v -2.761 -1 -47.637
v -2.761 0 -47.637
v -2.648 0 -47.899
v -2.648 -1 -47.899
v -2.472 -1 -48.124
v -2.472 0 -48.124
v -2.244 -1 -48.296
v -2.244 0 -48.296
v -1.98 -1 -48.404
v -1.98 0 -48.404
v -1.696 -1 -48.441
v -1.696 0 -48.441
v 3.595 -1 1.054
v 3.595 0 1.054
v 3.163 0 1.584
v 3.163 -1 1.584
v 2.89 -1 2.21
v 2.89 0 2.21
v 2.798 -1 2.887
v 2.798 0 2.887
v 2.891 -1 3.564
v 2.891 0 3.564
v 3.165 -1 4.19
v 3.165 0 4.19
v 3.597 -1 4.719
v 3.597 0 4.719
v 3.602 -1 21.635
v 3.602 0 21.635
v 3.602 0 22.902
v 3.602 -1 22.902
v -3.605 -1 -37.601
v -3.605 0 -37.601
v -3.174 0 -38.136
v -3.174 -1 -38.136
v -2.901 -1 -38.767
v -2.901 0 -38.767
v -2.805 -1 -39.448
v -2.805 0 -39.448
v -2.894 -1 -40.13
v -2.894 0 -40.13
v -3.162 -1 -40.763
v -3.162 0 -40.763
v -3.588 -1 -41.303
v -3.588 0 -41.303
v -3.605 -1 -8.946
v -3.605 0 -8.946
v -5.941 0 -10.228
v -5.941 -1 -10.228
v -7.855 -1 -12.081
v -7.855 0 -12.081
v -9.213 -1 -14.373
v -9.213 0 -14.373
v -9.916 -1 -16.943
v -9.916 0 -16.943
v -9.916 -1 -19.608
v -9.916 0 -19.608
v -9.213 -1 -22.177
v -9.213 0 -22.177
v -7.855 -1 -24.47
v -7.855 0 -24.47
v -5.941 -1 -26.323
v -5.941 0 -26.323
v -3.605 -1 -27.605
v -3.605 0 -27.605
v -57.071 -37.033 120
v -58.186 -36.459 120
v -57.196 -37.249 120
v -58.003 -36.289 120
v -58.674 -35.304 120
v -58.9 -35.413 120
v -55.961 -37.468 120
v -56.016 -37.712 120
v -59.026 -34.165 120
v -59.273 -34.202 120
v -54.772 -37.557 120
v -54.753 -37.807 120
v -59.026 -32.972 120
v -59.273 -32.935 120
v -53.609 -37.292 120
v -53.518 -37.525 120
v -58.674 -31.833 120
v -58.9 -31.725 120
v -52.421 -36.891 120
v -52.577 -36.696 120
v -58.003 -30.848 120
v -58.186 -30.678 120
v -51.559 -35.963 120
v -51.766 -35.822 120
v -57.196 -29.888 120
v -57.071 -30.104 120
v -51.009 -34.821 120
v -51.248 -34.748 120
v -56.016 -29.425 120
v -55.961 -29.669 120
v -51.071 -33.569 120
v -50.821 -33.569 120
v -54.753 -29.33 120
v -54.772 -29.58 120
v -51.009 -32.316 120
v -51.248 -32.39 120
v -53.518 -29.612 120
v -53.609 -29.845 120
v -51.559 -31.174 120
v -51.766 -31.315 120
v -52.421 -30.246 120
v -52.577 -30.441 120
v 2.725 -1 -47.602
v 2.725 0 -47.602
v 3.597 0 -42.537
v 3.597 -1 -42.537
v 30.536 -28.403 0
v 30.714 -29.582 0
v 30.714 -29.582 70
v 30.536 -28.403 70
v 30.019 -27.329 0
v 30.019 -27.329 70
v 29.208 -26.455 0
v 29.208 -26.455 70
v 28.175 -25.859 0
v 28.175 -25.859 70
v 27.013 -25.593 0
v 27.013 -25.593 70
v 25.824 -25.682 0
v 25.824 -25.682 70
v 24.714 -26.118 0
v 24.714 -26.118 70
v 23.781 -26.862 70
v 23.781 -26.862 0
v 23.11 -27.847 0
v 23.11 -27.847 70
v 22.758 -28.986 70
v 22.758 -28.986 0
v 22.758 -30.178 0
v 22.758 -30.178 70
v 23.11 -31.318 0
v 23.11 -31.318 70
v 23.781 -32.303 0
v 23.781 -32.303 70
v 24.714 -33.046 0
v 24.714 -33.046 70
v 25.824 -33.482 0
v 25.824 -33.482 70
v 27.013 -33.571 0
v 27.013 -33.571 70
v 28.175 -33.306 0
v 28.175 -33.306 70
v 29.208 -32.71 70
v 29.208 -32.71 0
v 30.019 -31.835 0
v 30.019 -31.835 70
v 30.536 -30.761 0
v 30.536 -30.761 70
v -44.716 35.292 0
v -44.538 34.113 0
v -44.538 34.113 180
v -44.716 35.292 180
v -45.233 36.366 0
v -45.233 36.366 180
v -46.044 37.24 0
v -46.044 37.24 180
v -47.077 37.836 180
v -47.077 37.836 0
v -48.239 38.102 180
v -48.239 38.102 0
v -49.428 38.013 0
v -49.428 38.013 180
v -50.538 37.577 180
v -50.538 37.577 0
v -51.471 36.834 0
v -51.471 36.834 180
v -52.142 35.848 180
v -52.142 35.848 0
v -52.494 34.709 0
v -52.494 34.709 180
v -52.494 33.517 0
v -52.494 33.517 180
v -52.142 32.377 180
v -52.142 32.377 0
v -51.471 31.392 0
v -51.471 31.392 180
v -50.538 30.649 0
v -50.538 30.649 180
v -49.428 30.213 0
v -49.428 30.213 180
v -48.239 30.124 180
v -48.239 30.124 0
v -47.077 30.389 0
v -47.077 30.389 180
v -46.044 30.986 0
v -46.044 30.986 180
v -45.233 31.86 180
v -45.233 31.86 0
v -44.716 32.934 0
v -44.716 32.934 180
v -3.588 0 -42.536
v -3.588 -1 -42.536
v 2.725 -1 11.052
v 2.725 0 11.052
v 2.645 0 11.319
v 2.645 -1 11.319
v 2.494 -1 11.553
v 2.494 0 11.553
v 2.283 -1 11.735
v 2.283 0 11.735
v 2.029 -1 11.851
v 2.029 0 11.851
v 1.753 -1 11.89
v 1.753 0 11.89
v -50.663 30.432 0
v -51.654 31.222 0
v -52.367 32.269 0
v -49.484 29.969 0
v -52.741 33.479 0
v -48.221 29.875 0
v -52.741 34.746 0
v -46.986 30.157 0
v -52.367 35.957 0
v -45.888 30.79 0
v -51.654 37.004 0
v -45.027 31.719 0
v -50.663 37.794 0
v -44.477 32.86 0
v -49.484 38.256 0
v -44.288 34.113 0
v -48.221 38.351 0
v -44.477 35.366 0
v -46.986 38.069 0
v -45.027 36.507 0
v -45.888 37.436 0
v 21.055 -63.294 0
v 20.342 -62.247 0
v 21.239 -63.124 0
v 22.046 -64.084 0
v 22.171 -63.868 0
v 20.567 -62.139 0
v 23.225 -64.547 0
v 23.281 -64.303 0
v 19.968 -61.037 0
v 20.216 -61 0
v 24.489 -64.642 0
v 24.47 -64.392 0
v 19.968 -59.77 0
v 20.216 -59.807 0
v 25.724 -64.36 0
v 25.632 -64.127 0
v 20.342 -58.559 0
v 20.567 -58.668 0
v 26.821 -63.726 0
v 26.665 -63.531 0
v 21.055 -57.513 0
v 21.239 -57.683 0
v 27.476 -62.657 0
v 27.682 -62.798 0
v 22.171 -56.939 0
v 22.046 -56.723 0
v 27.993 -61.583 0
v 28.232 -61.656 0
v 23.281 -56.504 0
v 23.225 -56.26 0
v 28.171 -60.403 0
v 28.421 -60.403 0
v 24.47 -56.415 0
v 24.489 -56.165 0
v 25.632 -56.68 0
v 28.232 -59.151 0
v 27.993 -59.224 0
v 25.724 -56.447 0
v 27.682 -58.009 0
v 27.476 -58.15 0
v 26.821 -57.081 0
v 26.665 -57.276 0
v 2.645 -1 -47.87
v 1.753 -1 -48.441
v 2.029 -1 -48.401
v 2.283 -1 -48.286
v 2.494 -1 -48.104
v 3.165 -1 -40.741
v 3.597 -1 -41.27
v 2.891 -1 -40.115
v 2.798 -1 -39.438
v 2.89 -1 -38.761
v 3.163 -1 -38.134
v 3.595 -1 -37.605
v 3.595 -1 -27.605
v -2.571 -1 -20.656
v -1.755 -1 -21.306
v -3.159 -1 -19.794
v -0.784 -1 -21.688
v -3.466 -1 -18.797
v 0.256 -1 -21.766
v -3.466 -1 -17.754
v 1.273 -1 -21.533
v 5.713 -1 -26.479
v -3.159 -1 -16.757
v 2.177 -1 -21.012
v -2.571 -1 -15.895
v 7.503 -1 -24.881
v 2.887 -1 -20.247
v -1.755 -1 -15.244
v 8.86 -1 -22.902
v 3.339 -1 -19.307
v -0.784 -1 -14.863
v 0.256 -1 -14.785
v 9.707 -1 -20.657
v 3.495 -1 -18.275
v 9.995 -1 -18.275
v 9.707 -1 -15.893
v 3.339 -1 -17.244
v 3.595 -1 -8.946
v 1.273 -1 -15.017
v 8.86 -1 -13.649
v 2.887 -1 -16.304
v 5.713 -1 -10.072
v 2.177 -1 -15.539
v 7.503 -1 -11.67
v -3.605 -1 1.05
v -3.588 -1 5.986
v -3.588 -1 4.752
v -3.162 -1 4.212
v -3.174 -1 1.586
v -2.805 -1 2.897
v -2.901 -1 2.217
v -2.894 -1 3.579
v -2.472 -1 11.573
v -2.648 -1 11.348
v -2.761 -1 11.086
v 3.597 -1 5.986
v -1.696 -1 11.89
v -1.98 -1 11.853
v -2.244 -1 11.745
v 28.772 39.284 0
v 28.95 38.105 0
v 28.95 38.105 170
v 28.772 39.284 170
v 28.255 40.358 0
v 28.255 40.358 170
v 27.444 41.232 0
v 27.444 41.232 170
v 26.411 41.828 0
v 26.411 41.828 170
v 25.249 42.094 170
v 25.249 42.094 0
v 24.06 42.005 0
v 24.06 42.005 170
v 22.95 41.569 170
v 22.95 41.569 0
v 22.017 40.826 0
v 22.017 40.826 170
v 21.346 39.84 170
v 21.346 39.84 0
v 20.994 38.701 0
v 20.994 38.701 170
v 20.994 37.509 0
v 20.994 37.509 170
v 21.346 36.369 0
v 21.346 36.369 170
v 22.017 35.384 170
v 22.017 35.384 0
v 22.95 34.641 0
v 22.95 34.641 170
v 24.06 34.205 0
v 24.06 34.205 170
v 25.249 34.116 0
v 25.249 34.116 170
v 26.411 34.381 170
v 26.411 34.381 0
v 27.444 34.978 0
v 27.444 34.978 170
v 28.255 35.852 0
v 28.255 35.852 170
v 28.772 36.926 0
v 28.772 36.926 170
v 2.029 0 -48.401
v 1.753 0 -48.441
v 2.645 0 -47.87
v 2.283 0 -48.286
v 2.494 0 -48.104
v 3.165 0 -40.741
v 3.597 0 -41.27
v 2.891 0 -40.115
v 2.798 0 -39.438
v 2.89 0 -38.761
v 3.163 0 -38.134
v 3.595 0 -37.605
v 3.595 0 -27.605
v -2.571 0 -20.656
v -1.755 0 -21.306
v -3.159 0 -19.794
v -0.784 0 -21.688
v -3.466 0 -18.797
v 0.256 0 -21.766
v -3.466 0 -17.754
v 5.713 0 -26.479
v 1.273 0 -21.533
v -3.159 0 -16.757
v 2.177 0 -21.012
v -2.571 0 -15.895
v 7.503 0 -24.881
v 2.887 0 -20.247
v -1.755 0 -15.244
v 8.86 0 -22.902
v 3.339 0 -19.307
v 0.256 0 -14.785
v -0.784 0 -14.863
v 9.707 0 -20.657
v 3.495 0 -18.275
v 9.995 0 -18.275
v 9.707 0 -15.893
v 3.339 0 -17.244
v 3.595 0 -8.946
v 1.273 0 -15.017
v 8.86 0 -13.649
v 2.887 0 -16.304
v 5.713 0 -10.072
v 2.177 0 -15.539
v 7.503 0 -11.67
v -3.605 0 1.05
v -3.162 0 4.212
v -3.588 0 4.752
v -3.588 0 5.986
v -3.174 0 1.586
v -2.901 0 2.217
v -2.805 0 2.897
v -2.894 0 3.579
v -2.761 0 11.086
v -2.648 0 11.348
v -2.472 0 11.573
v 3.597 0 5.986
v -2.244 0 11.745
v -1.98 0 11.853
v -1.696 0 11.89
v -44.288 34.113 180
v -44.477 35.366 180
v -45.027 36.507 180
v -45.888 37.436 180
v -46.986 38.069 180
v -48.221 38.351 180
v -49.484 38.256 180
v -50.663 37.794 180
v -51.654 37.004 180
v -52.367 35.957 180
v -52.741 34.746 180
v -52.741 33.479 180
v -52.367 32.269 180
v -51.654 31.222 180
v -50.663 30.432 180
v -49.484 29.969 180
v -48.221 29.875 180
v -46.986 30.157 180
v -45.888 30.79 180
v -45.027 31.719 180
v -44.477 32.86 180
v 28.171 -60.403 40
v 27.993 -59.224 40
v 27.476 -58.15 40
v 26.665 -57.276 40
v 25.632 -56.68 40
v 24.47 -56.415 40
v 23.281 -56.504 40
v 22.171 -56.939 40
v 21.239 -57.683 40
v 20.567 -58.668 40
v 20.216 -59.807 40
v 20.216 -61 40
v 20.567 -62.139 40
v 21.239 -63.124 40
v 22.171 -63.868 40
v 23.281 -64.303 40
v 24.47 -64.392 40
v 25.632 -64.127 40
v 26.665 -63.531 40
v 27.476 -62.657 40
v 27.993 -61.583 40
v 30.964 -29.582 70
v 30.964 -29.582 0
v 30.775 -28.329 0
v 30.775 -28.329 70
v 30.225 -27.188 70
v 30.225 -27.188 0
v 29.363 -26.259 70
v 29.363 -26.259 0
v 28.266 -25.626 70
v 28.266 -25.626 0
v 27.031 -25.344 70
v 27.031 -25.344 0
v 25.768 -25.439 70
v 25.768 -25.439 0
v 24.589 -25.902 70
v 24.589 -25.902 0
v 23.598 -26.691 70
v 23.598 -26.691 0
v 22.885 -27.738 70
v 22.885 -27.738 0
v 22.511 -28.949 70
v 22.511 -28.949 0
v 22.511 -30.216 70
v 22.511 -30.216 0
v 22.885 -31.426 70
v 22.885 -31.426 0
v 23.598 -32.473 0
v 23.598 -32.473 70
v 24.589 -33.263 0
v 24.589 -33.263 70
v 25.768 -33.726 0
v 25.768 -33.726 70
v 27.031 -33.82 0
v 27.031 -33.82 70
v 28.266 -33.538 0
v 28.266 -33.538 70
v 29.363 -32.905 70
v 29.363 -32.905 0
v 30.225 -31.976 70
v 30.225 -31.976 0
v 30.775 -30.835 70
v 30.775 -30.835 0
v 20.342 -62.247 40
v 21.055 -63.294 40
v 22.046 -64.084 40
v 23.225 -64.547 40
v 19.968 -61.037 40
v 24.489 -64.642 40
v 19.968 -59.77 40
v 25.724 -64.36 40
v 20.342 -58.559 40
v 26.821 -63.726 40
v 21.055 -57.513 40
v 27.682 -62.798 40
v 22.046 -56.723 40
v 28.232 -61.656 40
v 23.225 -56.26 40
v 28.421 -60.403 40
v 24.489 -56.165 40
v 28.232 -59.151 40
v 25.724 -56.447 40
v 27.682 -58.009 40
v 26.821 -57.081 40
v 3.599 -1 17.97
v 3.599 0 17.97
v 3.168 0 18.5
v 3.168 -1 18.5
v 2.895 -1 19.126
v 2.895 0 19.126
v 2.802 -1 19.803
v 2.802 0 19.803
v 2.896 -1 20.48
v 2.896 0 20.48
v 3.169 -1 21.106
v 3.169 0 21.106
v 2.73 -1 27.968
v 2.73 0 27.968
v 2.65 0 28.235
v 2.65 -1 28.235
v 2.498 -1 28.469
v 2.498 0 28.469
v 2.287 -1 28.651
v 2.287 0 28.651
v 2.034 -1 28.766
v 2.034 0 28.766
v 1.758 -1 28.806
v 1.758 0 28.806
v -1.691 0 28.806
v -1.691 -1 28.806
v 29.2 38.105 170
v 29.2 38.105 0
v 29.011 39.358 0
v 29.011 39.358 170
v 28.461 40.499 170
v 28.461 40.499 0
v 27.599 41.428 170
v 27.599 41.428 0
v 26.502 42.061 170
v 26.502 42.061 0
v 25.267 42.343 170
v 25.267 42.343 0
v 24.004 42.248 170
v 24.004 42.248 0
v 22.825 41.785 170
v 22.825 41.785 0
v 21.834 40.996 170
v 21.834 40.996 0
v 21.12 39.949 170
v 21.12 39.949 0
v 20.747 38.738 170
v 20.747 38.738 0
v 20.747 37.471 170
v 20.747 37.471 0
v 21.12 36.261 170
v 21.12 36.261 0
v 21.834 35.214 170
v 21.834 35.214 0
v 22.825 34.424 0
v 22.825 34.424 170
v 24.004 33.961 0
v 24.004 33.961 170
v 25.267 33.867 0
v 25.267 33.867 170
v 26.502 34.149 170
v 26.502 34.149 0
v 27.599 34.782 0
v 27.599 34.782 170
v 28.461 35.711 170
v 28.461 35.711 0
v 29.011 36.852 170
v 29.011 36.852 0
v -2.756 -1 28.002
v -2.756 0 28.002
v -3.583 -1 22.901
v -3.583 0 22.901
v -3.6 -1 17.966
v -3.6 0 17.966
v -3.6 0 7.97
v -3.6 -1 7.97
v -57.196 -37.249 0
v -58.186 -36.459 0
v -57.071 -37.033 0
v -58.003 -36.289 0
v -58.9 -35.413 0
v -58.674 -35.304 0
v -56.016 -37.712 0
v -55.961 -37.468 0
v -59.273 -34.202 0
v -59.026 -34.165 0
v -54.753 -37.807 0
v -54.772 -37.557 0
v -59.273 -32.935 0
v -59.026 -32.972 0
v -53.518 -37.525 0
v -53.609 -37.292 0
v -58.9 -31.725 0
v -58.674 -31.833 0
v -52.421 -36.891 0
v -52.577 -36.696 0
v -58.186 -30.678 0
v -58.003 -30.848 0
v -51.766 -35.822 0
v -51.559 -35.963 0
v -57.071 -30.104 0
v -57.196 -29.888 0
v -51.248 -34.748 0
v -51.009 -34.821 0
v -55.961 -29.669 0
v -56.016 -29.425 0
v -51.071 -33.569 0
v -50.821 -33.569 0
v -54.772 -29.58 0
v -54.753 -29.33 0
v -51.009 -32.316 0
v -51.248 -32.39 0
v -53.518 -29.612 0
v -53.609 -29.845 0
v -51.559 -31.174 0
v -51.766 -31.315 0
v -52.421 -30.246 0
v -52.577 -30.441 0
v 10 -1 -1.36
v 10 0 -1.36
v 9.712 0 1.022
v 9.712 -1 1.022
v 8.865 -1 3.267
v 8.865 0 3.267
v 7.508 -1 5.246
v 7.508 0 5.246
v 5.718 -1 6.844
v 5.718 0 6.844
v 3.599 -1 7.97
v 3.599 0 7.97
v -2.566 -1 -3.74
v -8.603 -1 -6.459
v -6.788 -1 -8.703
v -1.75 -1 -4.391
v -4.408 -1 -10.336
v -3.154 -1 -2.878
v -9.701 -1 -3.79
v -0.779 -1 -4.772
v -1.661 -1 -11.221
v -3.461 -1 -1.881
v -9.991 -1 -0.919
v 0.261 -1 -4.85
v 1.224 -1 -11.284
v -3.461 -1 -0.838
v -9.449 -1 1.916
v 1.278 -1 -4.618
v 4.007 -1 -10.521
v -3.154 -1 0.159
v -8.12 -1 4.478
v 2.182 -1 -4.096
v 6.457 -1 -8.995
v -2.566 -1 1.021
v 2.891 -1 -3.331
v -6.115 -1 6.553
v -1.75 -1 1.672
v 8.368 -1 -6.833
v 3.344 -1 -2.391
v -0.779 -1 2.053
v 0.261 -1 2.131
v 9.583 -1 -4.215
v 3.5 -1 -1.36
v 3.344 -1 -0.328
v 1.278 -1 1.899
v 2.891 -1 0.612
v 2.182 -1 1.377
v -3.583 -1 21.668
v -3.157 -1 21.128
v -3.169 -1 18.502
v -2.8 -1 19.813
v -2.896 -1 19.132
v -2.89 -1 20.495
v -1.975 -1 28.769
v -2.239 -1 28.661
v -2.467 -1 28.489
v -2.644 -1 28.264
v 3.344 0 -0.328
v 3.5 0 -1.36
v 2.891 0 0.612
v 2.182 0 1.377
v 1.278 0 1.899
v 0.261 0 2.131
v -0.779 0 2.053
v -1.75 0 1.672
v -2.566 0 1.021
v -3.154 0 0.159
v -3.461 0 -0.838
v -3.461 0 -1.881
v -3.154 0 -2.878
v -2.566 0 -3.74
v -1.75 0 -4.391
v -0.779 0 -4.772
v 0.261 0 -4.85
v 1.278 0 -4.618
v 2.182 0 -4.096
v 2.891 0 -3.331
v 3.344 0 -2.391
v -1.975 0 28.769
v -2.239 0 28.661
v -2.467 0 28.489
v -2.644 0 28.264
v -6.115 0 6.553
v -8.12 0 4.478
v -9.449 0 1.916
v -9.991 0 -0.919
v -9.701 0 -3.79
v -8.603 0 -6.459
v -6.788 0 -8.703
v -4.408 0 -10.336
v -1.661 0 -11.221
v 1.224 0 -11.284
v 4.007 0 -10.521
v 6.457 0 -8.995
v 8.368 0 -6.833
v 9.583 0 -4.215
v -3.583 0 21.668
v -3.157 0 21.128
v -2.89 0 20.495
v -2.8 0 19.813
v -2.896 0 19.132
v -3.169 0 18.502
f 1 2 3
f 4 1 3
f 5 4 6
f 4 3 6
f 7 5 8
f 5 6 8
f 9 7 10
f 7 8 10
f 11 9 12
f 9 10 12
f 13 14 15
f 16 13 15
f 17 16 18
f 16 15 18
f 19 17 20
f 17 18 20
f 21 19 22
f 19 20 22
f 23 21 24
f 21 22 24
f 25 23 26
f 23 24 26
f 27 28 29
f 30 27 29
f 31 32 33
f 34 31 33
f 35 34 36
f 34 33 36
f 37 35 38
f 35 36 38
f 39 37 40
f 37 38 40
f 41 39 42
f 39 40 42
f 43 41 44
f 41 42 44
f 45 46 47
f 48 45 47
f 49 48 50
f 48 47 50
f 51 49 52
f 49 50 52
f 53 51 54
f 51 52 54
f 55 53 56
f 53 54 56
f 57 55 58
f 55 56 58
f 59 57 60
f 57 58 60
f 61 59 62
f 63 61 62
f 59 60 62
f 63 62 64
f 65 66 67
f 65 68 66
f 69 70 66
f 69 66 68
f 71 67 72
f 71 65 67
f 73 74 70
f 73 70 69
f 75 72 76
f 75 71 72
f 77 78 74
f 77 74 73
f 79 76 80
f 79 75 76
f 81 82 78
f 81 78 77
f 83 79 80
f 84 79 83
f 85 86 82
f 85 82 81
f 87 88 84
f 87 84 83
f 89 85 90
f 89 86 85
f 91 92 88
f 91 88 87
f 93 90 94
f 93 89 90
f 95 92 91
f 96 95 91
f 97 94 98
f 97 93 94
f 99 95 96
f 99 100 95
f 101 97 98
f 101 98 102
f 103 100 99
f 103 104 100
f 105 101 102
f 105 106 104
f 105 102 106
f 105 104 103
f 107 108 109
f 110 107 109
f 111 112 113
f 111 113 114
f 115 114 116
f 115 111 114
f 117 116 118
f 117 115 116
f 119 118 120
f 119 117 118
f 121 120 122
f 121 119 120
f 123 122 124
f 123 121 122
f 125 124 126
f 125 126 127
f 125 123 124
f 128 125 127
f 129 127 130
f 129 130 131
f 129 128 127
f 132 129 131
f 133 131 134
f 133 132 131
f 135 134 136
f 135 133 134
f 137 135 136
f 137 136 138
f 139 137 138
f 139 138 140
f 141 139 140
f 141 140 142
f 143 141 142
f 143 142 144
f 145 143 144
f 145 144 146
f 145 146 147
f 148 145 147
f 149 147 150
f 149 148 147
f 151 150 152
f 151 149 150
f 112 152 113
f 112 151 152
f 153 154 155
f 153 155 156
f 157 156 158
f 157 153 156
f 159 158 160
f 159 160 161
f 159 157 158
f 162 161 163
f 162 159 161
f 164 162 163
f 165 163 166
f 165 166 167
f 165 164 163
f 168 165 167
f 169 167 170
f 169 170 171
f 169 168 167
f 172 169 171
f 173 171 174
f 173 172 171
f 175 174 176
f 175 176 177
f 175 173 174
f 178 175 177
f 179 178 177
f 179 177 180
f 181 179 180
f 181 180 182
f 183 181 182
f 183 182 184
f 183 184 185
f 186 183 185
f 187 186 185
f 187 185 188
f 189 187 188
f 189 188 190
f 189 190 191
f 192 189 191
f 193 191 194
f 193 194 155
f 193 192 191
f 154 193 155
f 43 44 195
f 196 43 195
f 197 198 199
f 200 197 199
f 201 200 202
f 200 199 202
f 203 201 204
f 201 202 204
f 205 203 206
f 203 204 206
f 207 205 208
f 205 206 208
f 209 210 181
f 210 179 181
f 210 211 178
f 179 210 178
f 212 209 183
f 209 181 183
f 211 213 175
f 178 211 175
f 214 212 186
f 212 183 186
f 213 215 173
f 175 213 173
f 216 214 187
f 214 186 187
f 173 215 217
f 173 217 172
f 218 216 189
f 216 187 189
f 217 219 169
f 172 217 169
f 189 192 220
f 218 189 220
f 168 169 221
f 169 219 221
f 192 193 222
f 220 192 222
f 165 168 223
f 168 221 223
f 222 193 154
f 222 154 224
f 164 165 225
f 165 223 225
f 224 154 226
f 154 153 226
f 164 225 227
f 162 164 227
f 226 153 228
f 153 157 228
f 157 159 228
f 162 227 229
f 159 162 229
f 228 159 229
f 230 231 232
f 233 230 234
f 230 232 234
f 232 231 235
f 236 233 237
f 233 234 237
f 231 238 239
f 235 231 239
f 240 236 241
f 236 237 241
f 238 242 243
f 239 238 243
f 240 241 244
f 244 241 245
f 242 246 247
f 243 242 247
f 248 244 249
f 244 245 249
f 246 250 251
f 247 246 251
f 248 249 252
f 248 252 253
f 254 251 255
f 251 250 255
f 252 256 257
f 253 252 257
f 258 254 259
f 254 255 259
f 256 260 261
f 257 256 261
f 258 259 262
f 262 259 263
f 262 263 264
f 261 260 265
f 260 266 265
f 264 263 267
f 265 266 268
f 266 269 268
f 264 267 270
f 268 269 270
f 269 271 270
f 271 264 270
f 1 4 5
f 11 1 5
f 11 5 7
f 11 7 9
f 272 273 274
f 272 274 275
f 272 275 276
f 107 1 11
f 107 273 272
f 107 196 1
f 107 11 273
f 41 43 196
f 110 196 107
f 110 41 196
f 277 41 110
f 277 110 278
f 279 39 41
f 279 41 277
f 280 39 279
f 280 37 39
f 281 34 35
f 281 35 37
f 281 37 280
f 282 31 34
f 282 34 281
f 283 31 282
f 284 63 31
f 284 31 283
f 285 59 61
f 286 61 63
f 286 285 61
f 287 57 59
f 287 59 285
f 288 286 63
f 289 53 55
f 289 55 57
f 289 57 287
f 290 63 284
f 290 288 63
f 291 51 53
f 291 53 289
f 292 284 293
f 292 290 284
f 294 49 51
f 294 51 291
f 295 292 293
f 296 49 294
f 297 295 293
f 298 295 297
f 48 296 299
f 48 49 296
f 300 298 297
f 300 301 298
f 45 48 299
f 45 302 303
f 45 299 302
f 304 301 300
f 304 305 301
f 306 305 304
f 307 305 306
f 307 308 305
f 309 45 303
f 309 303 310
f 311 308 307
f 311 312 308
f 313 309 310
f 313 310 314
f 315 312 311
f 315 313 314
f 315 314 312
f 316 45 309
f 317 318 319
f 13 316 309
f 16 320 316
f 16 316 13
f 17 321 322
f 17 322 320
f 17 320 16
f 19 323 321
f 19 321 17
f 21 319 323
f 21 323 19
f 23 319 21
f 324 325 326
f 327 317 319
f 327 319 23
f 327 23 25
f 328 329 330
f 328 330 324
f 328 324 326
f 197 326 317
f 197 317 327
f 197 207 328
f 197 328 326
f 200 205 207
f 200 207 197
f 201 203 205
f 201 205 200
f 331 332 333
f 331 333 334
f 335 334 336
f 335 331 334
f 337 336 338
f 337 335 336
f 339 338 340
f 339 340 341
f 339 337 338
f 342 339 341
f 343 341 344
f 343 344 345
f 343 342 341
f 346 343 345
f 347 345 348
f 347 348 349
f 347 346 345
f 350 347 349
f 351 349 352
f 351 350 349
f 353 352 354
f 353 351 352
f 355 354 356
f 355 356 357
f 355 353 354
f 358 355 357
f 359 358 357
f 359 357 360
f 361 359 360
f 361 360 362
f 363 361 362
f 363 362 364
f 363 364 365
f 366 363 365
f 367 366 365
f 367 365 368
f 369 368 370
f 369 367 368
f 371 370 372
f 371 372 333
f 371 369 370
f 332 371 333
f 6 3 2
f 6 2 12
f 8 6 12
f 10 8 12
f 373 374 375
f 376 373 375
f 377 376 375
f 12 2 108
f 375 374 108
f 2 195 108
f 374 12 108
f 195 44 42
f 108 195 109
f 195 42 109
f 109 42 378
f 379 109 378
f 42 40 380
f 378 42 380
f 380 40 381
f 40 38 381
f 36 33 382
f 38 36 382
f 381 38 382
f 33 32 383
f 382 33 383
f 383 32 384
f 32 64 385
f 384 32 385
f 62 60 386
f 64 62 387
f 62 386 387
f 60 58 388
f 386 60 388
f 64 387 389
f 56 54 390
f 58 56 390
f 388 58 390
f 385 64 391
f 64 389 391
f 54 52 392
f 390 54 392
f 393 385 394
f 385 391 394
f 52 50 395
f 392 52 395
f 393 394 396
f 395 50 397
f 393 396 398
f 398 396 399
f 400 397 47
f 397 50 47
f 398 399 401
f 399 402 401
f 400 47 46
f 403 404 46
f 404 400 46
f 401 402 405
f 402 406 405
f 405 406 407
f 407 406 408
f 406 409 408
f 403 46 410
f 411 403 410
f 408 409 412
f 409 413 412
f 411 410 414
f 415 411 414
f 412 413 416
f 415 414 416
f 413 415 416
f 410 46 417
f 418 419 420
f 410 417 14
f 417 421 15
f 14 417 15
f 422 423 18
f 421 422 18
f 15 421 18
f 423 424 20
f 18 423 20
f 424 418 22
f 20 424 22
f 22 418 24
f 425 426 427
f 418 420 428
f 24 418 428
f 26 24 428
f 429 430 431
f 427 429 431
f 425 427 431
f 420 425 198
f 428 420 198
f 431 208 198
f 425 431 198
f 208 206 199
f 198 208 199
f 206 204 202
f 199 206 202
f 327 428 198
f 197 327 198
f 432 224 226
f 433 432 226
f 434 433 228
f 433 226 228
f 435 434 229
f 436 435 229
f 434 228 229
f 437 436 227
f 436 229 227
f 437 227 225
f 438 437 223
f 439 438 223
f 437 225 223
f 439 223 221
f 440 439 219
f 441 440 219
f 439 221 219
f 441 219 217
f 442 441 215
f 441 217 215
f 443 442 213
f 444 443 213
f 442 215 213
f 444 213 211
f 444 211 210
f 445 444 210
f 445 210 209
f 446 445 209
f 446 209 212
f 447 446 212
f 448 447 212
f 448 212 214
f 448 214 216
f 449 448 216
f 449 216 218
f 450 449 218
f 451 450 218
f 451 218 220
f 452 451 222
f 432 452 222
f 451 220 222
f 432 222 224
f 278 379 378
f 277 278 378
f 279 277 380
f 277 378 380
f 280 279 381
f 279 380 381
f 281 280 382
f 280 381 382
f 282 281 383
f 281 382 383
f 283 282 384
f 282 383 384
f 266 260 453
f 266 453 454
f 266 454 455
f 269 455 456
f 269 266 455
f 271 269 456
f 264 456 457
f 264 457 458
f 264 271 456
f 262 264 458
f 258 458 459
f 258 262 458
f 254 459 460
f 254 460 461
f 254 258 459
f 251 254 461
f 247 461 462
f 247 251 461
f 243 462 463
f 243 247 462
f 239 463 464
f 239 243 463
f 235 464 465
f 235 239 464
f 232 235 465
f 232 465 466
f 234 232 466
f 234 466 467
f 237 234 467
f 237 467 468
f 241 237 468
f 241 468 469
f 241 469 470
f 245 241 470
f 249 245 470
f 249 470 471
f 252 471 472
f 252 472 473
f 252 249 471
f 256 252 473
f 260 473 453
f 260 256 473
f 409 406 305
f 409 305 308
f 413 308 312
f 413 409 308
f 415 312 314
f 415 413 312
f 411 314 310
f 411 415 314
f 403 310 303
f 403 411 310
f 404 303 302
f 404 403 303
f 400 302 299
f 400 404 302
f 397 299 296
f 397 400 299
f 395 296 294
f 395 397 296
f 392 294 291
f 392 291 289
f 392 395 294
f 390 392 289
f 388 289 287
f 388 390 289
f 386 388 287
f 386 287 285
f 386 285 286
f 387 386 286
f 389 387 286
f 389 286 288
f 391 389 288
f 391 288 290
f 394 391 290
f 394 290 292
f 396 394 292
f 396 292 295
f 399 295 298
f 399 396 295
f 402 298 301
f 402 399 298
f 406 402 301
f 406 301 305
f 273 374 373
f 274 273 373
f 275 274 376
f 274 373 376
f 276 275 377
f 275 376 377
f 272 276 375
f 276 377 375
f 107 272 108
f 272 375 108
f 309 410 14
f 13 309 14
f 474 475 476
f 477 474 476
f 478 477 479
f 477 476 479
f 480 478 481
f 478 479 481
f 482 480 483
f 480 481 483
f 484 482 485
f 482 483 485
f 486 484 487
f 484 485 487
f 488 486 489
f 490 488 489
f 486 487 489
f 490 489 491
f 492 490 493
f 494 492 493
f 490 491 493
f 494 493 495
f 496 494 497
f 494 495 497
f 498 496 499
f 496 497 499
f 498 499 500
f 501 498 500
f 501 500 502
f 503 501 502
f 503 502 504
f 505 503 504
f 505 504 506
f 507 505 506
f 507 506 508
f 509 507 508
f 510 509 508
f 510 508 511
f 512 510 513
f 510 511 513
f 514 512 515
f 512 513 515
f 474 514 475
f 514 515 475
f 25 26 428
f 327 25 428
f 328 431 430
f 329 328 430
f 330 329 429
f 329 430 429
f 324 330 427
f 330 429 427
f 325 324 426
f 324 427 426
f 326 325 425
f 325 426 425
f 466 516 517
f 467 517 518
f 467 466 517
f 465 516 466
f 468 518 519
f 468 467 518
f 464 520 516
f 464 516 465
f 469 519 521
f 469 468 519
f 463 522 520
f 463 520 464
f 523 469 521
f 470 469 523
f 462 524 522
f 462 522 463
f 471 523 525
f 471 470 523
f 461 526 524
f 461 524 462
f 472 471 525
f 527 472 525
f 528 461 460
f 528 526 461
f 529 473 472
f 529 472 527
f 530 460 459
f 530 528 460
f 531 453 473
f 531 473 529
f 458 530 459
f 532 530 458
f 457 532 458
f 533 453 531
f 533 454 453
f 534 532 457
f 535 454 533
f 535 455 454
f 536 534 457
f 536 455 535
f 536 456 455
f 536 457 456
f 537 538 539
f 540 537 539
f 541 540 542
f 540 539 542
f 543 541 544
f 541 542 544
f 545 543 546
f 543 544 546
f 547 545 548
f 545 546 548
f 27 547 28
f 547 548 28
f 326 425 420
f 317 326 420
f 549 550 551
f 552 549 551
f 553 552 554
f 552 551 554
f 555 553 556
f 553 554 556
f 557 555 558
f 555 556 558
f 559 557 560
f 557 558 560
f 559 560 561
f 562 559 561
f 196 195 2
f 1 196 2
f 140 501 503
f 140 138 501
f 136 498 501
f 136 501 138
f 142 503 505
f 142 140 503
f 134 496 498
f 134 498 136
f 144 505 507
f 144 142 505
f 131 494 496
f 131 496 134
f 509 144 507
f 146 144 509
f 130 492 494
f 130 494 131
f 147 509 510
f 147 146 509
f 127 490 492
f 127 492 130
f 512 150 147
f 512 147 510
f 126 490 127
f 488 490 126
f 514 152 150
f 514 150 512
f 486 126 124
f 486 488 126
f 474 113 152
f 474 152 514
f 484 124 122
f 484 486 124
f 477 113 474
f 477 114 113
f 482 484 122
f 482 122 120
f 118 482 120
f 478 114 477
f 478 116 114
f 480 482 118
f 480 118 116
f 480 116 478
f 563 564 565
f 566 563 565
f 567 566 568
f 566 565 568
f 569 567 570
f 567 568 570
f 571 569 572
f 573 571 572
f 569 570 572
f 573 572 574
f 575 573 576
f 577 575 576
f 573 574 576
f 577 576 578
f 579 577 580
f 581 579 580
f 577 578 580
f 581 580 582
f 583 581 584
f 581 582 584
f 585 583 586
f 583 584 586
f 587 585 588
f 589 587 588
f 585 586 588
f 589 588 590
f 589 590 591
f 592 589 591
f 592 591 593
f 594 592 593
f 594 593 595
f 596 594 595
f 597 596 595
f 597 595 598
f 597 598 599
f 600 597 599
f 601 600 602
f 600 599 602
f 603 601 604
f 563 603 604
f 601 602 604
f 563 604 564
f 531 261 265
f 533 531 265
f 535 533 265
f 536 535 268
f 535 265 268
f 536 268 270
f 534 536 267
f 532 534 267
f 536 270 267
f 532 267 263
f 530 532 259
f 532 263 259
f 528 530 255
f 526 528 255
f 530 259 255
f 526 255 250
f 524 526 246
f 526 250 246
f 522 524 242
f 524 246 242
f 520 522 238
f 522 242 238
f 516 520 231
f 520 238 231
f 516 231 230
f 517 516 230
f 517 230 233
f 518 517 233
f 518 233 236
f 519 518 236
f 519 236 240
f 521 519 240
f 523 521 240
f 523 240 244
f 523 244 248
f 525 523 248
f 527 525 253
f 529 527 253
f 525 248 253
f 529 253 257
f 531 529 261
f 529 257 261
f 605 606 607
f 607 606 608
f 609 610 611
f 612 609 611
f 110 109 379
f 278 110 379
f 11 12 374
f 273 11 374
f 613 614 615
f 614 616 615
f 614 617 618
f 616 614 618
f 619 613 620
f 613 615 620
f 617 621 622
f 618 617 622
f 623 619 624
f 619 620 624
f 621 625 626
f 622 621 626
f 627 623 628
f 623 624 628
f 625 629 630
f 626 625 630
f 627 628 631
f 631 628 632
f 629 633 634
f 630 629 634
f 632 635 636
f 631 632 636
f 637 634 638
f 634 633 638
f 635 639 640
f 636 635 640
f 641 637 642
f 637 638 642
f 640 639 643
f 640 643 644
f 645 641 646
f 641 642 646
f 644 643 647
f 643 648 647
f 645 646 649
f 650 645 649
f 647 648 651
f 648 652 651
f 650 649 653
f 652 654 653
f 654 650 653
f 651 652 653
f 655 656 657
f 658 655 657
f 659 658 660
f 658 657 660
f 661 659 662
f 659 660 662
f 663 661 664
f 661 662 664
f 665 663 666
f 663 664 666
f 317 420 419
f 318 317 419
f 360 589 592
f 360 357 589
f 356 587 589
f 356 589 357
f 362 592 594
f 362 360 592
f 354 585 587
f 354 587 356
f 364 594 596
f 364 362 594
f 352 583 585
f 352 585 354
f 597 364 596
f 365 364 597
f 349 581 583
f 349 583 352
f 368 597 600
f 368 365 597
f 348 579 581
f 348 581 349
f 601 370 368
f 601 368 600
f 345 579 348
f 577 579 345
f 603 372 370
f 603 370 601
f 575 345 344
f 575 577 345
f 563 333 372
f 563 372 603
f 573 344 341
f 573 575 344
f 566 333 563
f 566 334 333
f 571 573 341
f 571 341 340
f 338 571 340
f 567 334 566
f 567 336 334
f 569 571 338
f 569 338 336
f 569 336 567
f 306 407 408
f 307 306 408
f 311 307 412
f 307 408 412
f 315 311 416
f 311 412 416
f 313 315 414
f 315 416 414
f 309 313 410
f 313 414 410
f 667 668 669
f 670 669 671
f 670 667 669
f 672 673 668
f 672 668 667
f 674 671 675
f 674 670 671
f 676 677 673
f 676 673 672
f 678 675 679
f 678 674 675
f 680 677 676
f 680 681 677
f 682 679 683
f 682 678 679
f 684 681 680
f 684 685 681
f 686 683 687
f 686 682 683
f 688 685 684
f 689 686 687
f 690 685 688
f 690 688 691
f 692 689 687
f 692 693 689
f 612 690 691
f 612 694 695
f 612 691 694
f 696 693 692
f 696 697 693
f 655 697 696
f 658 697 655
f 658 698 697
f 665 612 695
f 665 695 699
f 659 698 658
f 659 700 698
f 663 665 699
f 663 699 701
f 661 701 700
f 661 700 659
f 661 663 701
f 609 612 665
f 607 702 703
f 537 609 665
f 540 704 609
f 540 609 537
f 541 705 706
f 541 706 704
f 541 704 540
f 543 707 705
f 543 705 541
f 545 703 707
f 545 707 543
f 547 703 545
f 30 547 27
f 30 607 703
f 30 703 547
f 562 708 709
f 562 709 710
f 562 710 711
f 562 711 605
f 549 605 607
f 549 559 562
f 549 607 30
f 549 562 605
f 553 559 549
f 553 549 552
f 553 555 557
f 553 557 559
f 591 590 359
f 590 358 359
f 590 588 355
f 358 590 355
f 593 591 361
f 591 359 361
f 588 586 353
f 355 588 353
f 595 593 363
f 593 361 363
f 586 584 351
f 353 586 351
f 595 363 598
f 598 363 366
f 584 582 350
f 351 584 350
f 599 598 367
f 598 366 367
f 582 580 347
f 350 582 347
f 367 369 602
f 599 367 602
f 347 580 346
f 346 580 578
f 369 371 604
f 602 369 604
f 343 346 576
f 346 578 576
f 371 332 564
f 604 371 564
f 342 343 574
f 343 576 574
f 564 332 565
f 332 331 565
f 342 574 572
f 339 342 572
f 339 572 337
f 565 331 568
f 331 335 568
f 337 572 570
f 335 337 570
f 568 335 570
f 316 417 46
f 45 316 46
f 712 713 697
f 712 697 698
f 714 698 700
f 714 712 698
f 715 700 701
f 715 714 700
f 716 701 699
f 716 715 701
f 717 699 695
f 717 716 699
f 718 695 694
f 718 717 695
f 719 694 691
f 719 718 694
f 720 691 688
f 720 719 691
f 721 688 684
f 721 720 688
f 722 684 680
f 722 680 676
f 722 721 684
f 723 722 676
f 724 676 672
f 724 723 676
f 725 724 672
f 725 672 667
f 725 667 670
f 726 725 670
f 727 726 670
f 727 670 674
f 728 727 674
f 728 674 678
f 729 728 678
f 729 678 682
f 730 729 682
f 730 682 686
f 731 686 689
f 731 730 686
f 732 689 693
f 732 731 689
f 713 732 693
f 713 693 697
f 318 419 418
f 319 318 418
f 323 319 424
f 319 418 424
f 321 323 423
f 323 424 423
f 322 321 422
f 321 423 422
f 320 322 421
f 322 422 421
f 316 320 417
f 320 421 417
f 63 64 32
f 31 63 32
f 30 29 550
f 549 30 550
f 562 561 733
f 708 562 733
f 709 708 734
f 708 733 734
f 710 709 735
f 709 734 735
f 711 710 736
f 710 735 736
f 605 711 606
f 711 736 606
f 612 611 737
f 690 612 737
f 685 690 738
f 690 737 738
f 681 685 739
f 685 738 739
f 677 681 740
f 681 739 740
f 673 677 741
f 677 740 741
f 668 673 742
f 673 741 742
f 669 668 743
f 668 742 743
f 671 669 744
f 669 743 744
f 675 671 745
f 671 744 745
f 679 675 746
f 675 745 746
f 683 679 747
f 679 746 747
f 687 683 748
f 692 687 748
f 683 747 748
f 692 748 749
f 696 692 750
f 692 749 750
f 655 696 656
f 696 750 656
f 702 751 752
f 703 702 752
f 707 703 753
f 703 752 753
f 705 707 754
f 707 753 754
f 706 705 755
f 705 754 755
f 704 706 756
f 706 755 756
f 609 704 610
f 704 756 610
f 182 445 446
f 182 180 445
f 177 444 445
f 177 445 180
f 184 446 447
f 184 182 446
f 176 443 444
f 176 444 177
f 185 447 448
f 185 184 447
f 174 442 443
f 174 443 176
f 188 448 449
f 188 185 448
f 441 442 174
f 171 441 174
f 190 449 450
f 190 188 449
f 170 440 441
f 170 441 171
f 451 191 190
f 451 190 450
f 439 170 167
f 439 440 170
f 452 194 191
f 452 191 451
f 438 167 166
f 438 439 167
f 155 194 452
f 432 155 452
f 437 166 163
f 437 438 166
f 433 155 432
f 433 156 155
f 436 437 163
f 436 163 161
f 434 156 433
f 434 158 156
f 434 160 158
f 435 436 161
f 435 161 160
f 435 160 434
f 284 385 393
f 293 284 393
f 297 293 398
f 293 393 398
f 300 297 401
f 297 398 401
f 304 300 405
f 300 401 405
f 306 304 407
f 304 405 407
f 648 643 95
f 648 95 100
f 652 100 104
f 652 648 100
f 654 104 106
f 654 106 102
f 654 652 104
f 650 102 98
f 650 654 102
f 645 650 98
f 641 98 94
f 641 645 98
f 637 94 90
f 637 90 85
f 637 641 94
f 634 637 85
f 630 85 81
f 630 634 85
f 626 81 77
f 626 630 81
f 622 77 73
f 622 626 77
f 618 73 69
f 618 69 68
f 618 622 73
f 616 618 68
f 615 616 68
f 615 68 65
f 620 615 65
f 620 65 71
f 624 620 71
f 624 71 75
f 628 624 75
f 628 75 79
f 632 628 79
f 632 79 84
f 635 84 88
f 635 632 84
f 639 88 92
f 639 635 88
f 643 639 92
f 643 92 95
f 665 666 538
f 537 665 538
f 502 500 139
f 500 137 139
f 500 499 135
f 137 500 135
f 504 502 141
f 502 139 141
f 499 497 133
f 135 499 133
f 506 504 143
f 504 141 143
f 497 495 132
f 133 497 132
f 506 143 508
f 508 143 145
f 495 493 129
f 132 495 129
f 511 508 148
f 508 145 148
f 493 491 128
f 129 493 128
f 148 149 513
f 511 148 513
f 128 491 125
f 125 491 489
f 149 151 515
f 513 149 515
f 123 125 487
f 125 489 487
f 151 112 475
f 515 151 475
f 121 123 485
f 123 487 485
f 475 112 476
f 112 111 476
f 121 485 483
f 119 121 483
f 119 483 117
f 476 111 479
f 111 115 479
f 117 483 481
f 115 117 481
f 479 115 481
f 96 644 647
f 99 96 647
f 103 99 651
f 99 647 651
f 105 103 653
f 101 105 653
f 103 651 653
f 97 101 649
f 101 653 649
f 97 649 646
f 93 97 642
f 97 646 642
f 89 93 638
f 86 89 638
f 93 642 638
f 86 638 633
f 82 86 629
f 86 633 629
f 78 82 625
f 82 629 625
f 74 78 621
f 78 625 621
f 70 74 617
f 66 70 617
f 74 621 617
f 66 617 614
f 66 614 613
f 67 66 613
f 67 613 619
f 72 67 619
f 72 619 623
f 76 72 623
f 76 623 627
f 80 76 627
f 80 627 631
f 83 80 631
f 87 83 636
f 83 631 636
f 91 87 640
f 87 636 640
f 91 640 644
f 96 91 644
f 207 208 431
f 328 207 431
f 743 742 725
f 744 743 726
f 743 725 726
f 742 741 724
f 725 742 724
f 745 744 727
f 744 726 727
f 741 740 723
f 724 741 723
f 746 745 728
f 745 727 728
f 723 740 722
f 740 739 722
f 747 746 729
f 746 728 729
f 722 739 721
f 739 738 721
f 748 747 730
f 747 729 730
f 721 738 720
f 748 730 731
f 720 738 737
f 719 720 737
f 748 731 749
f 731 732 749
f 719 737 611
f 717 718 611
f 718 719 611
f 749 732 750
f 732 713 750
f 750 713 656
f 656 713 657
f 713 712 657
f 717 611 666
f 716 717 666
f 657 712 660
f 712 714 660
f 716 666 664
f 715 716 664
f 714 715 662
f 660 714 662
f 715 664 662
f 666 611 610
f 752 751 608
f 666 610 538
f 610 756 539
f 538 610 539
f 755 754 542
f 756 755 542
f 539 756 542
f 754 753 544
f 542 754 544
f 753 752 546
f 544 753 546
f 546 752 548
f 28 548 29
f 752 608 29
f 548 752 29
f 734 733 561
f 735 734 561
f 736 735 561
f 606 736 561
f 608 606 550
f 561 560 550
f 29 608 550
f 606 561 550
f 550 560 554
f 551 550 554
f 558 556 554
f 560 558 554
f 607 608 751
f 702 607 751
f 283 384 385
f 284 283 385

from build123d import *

# Parameters (mm, degrees)
F0_R      = 3.5
F1_DEPTH  = 1
F2_R      = 4.25
F2_R_2    = 4
F3_DEPTH  = 120
F4_R      = 4.25
F4_R_2    = 4
F5_DEPTH  = 180
F6_R      = 4.25
F6_R_2    = 4
F7_DEPTH  = 170
F8_R      = 4.25
F8_R_2    = 4
F9_DEPTH  = 70
F10_R     = 4.25
F10_R_2   = 4
F11_DEPTH = 40
F12_R     = 3.5
F13_DEPTH = 1


with BuildPart() as f1:
    # F0 (on Front) → F1 (new body)
    with BuildSketch(Plane.XZ):
        with BuildLine():
            ThreePointArc((-1.691495, 28.806018), (-2.358822, 28.582301), (-2.756461, 28.001562))
            Line((-2.756461, 28.001562), (-3.583157, 22.901481))
            Line((-3.583157, 22.901481), (-3.583157, 21.667795))
            ThreePointArc((-3.583157, 21.667795), (-2.800422, 19.813258), (-3.600286, 17.966043))
            Line((-3.600286, 17.966043), (-3.600286, 11.83005))
            Line((-3.600286, 11.83005), (3.599391, 11.83005))
            Line((3.599391, 11.83005), (3.599391, 17.969944))
            ThreePointArc((3.599391, 17.969944), (2.802389, 19.803012), (3.601747, 21.635054))
            Line((3.601747, 21.635054), (3.601747, 22.901675))
            Line((3.601747, 22.901675), (2.729514, 27.967552))
            ThreePointArc((2.729514, 27.967552), (2.399436, 28.567432), (1.757654, 28.806018))
            Line((1.757654, 28.806018), (-1.691495, 28.806018))
        make_face()
        with BuildLine():
            Line((3.599391, 11.83005), (-3.600286, 11.83005))
            Line((-3.600286, 11.83005), (-3.600286, 7.97005))
            ThreePointArc((-3.600286, 7.97005), (-0.000448, 8.640464), (3.599391, 7.97005))
            Line((3.599391, 7.97005), (3.599391, 11.83005))
        make_face()
        with BuildLine():
            ThreePointArc((3.599391, 7.97005), (-0.000448, 8.640464), (-3.600286, 7.97005))
            Line((-3.600286, 7.97005), (3.599391, 7.97005))
        make_face()
        with BuildLine():
            Line((3.599391, 7.97005), (-3.600286, 7.97005))
            ThreePointArc((-3.600286, 7.97005), (-5.657373, -9.605698), (9.999552, -1.359536))
            ThreePointArc((9.999552, -1.359536), (8.245715, 4.29739), (3.599391, 7.97005))
        make_face()
        with Locations((-0.000448, -1.359536)):
            Circle(F0_R, mode=Mode.SUBTRACT)
    extrude(amount=F1_DEPTH)


with BuildPart() as f3:
    # F2 (on Top) → F3 (new body)
    with BuildSketch(Plane.XY):
        with Locations((-55.070568, -33.56855)):
            Circle(F2_R)
        with Locations((-55.070568, -33.56855)):
            Circle(F2_R_2, mode=Mode.SUBTRACT)
    extrude(amount=F3_DEPTH)


with BuildPart() as f5:
    # F4 (on Top) → F5 (new body)
    with BuildSketch(Plane.XY):
        with Locations((-48.538309, 34.112904)):
            Circle(F4_R)
        with Locations((-48.538309, 34.112904)):
            Circle(F4_R_2, mode=Mode.SUBTRACT)
    extrude(amount=F5_DEPTH)


with BuildPart() as f7:
    # F6 (on Top) → F7 (new body)
    with BuildSketch(Plane.XY):
        with Locations((24.949595, 38.10484)):
            Circle(F6_R)
        with Locations((24.949595, 38.10484)):
            Circle(F6_R_2, mode=Mode.SUBTRACT)
    extrude(amount=F7_DEPTH)


with BuildPart() as f9:
    # F8 (on Top) → F9 (new body)
    with BuildSketch(Plane.XY):
        with Locations((26.713643, -29.582191)):
            Circle(F8_R)
        with Locations((26.713643, -29.582191)):
            Circle(F8_R_2, mode=Mode.SUBTRACT)
    extrude(amount=F9_DEPTH)


with BuildPart() as f11:
    # F10 (on Top) → F11 (new body)
    with BuildSketch(Plane.XY):
        with Locations((24.170965, -60.403489)):
            Circle(F10_R)
        with Locations((24.170965, -60.403489)):
            Circle(F10_R_2, mode=Mode.SUBTRACT)
    extrude(amount=F11_DEPTH)


with BuildPart() as f13:
    # F12 (on Front) → F13 (new body)
    with BuildSketch(Plane.XZ):
        with BuildLine():
            ThreePointArc((-1.696306, 11.890147), (-2.363633, 11.66643), (-2.761272, 11.085691))
            Line((-2.761272, 11.085691), (-3.587968, 5.98561))
            Line((-3.587968, 5.98561), (-3.587968, 4.751925))
            ThreePointArc((-3.587968, 4.751925), (-2.805233, 2.897387), (-3.605097, 1.050173))
            Line((-3.605097, 1.050173), (-3.605097, -5.085821))
            Line((-3.605097, -5.085821), (3.59458, -5.085821))
            Line((3.59458, -5.085821), (3.59458, 1.054073))
            ThreePointArc((3.59458, 1.054073), (2.797578, 2.887141), (3.596937, 4.719183))
            Line((3.596937, 4.719183), (3.596937, 5.985804))
            Line((3.596937, 5.985804), (2.724703, 11.051681))
            ThreePointArc((2.724703, 11.051681), (2.394625, 11.651561), (1.752843, 11.890147))
            Line((1.752843, 11.890147), (-1.696306, 11.890147))
        make_face()
        with BuildLine():
            Line((3.59458, -5.085821), (-3.605097, -5.085821))
            Line((-3.605097, -5.085821), (-3.605097, -8.945821))
            ThreePointArc((-3.605097, -8.945821), (-0.005258, -8.275406), (3.59458, -8.945821))
            Line((3.59458, -8.945821), (3.59458, -5.085821))
        make_face()
        with BuildLine():
            Line((3.59458, -8.945821), (-3.605097, -8.945821))
            ThreePointArc((-3.605097, -8.945821), (-10.005258, -18.275406), (-3.605097, -27.604992))
            Line((-3.605097, -27.604992), (3.59458, -27.604992))
            ThreePointArc((3.59458, -27.604992), (8.240904, -23.932332), (9.994742, -18.275406))
            ThreePointArc((9.994742, -18.275406), (8.240904, -12.618481), (3.59458, -8.945821))
        make_face()
        with Locations((-0.005258, -18.275406)):
            Circle(F12_R, mode=Mode.SUBTRACT)
        with BuildLine():
            ThreePointArc((3.59458, -27.604992), (-0.005258, -28.275406), (-3.605097, -27.604992))
            Line((-3.605097, -27.604992), (-3.605097, -31.464992))
            Line((-3.605097, -31.464992), (3.59458, -31.464992))
            Line((3.59458, -31.464992), (3.59458, -27.604992))
        make_face()
        with BuildLine():
            Line((3.59458, -31.464992), (-3.605097, -31.464992))
            Line((-3.605097, -31.464992), (-3.605097, -37.600985))
            ThreePointArc((-3.605097, -37.600985), (-2.805233, -39.4482), (-3.587968, -41.302737))
            Line((-3.587968, -41.302737), (-3.587968, -42.536423))
            Line((-3.587968, -42.536423), (-2.761272, -47.636504))
            ThreePointArc((-2.761272, -47.636504), (-2.363633, -48.217243), (-1.696306, -48.44096))
            Line((-1.696306, -48.44096), (1.752843, -48.44096))
            ThreePointArc((1.752843, -48.44096), (2.394625, -48.202374), (2.724703, -47.602494))
            Line((2.724703, -47.602494), (3.596937, -42.536617))
            Line((3.596937, -42.536617), (3.596937, -41.269996))
            ThreePointArc((3.596937, -41.269996), (2.797578, -39.437954), (3.59458, -37.604886))
            Line((3.59458, -37.604886), (3.59458, -31.464992))
        make_face()
        with BuildLine():
            ThreePointArc((3.59458, -8.945821), (-0.005258, -8.275406), (-3.605097, -8.945821))
            Line((-3.605097, -8.945821), (3.59458, -8.945821))
        make_face()
        with BuildLine():
            Line((3.59458, -27.604992), (-3.605097, -27.604992))
            ThreePointArc((-3.605097, -27.604992), (-0.005258, -28.275406), (3.59458, -27.604992))
        make_face()
    extrude(amount=F13_DEPTH)


solid = Compound([f1.part, f3.part, f5.part, f7.part, f9.part, f11.part, f13.part])
